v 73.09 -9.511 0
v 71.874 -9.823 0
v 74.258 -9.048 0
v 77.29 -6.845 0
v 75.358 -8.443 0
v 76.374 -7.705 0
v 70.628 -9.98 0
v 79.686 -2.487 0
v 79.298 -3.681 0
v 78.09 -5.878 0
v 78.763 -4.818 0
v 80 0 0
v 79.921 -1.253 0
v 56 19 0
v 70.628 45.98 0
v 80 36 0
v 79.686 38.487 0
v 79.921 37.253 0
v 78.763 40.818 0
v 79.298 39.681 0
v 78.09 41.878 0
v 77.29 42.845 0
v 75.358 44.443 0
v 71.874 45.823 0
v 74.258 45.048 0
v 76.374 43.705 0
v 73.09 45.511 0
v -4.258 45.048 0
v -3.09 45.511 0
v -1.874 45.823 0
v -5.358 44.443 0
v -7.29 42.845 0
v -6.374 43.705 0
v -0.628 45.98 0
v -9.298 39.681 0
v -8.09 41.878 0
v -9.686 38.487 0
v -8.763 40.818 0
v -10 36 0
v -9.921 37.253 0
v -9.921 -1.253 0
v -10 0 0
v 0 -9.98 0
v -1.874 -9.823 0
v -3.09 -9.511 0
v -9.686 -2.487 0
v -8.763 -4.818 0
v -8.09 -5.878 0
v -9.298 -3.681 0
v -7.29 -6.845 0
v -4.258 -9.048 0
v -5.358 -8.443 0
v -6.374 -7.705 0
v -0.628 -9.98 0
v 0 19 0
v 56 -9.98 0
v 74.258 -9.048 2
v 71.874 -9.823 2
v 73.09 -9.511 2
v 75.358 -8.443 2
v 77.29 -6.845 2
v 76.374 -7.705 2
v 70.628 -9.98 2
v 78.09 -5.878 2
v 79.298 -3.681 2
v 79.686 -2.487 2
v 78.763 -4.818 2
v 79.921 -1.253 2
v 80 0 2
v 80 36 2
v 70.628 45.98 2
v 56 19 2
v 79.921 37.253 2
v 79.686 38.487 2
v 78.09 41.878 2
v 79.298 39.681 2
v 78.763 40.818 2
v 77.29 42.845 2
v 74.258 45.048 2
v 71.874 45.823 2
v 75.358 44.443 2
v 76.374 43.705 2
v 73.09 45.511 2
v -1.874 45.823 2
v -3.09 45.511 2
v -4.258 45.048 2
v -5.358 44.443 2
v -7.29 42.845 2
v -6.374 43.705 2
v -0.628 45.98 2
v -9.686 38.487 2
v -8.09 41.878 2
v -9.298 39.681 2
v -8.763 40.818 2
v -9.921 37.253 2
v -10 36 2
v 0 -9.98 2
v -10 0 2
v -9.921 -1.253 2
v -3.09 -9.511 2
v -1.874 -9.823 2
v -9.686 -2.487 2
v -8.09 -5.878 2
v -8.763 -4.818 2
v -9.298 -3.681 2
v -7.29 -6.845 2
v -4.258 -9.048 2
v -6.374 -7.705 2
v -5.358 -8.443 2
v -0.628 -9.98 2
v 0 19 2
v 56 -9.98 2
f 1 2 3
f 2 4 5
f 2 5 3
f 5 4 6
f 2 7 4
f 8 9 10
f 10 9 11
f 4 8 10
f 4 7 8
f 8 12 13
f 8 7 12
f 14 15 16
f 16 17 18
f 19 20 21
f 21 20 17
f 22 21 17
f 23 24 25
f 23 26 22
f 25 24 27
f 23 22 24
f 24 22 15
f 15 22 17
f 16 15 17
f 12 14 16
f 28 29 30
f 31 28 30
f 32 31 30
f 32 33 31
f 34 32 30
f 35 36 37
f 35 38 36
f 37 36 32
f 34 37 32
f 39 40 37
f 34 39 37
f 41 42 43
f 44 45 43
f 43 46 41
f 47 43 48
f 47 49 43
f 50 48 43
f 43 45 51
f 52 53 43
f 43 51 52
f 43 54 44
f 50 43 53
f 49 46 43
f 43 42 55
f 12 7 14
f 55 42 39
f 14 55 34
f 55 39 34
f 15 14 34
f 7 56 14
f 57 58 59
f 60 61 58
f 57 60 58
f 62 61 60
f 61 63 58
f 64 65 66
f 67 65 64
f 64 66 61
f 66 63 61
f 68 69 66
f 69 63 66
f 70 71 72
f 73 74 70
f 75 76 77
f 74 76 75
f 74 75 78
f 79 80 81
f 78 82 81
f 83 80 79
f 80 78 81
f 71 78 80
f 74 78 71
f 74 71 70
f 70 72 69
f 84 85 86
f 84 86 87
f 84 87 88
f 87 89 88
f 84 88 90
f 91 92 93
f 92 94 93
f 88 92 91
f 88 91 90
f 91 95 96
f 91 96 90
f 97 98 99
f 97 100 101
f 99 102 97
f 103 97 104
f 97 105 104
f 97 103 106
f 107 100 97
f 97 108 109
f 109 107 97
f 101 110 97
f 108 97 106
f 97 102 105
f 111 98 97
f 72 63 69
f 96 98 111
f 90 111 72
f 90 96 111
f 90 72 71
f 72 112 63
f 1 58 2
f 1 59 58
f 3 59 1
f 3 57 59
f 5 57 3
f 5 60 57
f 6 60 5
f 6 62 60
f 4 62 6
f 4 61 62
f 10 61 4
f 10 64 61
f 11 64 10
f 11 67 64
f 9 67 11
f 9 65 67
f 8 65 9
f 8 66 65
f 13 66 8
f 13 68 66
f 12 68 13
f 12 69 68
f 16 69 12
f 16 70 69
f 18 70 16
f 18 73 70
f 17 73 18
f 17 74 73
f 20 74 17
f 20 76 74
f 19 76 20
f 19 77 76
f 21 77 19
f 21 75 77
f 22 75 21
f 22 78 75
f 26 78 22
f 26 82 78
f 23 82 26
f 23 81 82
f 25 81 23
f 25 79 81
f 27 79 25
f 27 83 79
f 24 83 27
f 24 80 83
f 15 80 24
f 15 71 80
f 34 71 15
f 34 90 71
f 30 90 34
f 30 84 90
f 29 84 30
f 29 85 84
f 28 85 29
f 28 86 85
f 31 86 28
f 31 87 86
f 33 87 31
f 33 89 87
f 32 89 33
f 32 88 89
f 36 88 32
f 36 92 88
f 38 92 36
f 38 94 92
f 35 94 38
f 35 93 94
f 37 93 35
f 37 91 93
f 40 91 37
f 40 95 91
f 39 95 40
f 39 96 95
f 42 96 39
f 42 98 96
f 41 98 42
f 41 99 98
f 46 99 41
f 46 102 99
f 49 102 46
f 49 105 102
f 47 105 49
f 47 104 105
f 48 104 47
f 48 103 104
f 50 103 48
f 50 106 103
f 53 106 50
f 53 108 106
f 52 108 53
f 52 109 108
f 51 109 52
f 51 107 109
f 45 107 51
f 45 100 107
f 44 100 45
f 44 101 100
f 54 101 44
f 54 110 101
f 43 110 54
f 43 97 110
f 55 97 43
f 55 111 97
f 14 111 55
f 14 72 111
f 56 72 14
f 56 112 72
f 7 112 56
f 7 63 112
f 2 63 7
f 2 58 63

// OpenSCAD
$fn = 50;

r = 10;
width = 90 - 2*r;
height = 56 - 2*r;

waveshare_width = 56;
waveshare_heigth = 29;

module peppermint_top(){
    minkowski(){
        square([width, height]);
        circle(r);
    }
}

module waveshare_display(){
    square([waveshare_width, waveshare_heigth]);
}

linear_extrude(2){
    difference(){
        peppermint_top();
        translate([0, -r, 0]){
            waveshare_display();
        }
    }
}
